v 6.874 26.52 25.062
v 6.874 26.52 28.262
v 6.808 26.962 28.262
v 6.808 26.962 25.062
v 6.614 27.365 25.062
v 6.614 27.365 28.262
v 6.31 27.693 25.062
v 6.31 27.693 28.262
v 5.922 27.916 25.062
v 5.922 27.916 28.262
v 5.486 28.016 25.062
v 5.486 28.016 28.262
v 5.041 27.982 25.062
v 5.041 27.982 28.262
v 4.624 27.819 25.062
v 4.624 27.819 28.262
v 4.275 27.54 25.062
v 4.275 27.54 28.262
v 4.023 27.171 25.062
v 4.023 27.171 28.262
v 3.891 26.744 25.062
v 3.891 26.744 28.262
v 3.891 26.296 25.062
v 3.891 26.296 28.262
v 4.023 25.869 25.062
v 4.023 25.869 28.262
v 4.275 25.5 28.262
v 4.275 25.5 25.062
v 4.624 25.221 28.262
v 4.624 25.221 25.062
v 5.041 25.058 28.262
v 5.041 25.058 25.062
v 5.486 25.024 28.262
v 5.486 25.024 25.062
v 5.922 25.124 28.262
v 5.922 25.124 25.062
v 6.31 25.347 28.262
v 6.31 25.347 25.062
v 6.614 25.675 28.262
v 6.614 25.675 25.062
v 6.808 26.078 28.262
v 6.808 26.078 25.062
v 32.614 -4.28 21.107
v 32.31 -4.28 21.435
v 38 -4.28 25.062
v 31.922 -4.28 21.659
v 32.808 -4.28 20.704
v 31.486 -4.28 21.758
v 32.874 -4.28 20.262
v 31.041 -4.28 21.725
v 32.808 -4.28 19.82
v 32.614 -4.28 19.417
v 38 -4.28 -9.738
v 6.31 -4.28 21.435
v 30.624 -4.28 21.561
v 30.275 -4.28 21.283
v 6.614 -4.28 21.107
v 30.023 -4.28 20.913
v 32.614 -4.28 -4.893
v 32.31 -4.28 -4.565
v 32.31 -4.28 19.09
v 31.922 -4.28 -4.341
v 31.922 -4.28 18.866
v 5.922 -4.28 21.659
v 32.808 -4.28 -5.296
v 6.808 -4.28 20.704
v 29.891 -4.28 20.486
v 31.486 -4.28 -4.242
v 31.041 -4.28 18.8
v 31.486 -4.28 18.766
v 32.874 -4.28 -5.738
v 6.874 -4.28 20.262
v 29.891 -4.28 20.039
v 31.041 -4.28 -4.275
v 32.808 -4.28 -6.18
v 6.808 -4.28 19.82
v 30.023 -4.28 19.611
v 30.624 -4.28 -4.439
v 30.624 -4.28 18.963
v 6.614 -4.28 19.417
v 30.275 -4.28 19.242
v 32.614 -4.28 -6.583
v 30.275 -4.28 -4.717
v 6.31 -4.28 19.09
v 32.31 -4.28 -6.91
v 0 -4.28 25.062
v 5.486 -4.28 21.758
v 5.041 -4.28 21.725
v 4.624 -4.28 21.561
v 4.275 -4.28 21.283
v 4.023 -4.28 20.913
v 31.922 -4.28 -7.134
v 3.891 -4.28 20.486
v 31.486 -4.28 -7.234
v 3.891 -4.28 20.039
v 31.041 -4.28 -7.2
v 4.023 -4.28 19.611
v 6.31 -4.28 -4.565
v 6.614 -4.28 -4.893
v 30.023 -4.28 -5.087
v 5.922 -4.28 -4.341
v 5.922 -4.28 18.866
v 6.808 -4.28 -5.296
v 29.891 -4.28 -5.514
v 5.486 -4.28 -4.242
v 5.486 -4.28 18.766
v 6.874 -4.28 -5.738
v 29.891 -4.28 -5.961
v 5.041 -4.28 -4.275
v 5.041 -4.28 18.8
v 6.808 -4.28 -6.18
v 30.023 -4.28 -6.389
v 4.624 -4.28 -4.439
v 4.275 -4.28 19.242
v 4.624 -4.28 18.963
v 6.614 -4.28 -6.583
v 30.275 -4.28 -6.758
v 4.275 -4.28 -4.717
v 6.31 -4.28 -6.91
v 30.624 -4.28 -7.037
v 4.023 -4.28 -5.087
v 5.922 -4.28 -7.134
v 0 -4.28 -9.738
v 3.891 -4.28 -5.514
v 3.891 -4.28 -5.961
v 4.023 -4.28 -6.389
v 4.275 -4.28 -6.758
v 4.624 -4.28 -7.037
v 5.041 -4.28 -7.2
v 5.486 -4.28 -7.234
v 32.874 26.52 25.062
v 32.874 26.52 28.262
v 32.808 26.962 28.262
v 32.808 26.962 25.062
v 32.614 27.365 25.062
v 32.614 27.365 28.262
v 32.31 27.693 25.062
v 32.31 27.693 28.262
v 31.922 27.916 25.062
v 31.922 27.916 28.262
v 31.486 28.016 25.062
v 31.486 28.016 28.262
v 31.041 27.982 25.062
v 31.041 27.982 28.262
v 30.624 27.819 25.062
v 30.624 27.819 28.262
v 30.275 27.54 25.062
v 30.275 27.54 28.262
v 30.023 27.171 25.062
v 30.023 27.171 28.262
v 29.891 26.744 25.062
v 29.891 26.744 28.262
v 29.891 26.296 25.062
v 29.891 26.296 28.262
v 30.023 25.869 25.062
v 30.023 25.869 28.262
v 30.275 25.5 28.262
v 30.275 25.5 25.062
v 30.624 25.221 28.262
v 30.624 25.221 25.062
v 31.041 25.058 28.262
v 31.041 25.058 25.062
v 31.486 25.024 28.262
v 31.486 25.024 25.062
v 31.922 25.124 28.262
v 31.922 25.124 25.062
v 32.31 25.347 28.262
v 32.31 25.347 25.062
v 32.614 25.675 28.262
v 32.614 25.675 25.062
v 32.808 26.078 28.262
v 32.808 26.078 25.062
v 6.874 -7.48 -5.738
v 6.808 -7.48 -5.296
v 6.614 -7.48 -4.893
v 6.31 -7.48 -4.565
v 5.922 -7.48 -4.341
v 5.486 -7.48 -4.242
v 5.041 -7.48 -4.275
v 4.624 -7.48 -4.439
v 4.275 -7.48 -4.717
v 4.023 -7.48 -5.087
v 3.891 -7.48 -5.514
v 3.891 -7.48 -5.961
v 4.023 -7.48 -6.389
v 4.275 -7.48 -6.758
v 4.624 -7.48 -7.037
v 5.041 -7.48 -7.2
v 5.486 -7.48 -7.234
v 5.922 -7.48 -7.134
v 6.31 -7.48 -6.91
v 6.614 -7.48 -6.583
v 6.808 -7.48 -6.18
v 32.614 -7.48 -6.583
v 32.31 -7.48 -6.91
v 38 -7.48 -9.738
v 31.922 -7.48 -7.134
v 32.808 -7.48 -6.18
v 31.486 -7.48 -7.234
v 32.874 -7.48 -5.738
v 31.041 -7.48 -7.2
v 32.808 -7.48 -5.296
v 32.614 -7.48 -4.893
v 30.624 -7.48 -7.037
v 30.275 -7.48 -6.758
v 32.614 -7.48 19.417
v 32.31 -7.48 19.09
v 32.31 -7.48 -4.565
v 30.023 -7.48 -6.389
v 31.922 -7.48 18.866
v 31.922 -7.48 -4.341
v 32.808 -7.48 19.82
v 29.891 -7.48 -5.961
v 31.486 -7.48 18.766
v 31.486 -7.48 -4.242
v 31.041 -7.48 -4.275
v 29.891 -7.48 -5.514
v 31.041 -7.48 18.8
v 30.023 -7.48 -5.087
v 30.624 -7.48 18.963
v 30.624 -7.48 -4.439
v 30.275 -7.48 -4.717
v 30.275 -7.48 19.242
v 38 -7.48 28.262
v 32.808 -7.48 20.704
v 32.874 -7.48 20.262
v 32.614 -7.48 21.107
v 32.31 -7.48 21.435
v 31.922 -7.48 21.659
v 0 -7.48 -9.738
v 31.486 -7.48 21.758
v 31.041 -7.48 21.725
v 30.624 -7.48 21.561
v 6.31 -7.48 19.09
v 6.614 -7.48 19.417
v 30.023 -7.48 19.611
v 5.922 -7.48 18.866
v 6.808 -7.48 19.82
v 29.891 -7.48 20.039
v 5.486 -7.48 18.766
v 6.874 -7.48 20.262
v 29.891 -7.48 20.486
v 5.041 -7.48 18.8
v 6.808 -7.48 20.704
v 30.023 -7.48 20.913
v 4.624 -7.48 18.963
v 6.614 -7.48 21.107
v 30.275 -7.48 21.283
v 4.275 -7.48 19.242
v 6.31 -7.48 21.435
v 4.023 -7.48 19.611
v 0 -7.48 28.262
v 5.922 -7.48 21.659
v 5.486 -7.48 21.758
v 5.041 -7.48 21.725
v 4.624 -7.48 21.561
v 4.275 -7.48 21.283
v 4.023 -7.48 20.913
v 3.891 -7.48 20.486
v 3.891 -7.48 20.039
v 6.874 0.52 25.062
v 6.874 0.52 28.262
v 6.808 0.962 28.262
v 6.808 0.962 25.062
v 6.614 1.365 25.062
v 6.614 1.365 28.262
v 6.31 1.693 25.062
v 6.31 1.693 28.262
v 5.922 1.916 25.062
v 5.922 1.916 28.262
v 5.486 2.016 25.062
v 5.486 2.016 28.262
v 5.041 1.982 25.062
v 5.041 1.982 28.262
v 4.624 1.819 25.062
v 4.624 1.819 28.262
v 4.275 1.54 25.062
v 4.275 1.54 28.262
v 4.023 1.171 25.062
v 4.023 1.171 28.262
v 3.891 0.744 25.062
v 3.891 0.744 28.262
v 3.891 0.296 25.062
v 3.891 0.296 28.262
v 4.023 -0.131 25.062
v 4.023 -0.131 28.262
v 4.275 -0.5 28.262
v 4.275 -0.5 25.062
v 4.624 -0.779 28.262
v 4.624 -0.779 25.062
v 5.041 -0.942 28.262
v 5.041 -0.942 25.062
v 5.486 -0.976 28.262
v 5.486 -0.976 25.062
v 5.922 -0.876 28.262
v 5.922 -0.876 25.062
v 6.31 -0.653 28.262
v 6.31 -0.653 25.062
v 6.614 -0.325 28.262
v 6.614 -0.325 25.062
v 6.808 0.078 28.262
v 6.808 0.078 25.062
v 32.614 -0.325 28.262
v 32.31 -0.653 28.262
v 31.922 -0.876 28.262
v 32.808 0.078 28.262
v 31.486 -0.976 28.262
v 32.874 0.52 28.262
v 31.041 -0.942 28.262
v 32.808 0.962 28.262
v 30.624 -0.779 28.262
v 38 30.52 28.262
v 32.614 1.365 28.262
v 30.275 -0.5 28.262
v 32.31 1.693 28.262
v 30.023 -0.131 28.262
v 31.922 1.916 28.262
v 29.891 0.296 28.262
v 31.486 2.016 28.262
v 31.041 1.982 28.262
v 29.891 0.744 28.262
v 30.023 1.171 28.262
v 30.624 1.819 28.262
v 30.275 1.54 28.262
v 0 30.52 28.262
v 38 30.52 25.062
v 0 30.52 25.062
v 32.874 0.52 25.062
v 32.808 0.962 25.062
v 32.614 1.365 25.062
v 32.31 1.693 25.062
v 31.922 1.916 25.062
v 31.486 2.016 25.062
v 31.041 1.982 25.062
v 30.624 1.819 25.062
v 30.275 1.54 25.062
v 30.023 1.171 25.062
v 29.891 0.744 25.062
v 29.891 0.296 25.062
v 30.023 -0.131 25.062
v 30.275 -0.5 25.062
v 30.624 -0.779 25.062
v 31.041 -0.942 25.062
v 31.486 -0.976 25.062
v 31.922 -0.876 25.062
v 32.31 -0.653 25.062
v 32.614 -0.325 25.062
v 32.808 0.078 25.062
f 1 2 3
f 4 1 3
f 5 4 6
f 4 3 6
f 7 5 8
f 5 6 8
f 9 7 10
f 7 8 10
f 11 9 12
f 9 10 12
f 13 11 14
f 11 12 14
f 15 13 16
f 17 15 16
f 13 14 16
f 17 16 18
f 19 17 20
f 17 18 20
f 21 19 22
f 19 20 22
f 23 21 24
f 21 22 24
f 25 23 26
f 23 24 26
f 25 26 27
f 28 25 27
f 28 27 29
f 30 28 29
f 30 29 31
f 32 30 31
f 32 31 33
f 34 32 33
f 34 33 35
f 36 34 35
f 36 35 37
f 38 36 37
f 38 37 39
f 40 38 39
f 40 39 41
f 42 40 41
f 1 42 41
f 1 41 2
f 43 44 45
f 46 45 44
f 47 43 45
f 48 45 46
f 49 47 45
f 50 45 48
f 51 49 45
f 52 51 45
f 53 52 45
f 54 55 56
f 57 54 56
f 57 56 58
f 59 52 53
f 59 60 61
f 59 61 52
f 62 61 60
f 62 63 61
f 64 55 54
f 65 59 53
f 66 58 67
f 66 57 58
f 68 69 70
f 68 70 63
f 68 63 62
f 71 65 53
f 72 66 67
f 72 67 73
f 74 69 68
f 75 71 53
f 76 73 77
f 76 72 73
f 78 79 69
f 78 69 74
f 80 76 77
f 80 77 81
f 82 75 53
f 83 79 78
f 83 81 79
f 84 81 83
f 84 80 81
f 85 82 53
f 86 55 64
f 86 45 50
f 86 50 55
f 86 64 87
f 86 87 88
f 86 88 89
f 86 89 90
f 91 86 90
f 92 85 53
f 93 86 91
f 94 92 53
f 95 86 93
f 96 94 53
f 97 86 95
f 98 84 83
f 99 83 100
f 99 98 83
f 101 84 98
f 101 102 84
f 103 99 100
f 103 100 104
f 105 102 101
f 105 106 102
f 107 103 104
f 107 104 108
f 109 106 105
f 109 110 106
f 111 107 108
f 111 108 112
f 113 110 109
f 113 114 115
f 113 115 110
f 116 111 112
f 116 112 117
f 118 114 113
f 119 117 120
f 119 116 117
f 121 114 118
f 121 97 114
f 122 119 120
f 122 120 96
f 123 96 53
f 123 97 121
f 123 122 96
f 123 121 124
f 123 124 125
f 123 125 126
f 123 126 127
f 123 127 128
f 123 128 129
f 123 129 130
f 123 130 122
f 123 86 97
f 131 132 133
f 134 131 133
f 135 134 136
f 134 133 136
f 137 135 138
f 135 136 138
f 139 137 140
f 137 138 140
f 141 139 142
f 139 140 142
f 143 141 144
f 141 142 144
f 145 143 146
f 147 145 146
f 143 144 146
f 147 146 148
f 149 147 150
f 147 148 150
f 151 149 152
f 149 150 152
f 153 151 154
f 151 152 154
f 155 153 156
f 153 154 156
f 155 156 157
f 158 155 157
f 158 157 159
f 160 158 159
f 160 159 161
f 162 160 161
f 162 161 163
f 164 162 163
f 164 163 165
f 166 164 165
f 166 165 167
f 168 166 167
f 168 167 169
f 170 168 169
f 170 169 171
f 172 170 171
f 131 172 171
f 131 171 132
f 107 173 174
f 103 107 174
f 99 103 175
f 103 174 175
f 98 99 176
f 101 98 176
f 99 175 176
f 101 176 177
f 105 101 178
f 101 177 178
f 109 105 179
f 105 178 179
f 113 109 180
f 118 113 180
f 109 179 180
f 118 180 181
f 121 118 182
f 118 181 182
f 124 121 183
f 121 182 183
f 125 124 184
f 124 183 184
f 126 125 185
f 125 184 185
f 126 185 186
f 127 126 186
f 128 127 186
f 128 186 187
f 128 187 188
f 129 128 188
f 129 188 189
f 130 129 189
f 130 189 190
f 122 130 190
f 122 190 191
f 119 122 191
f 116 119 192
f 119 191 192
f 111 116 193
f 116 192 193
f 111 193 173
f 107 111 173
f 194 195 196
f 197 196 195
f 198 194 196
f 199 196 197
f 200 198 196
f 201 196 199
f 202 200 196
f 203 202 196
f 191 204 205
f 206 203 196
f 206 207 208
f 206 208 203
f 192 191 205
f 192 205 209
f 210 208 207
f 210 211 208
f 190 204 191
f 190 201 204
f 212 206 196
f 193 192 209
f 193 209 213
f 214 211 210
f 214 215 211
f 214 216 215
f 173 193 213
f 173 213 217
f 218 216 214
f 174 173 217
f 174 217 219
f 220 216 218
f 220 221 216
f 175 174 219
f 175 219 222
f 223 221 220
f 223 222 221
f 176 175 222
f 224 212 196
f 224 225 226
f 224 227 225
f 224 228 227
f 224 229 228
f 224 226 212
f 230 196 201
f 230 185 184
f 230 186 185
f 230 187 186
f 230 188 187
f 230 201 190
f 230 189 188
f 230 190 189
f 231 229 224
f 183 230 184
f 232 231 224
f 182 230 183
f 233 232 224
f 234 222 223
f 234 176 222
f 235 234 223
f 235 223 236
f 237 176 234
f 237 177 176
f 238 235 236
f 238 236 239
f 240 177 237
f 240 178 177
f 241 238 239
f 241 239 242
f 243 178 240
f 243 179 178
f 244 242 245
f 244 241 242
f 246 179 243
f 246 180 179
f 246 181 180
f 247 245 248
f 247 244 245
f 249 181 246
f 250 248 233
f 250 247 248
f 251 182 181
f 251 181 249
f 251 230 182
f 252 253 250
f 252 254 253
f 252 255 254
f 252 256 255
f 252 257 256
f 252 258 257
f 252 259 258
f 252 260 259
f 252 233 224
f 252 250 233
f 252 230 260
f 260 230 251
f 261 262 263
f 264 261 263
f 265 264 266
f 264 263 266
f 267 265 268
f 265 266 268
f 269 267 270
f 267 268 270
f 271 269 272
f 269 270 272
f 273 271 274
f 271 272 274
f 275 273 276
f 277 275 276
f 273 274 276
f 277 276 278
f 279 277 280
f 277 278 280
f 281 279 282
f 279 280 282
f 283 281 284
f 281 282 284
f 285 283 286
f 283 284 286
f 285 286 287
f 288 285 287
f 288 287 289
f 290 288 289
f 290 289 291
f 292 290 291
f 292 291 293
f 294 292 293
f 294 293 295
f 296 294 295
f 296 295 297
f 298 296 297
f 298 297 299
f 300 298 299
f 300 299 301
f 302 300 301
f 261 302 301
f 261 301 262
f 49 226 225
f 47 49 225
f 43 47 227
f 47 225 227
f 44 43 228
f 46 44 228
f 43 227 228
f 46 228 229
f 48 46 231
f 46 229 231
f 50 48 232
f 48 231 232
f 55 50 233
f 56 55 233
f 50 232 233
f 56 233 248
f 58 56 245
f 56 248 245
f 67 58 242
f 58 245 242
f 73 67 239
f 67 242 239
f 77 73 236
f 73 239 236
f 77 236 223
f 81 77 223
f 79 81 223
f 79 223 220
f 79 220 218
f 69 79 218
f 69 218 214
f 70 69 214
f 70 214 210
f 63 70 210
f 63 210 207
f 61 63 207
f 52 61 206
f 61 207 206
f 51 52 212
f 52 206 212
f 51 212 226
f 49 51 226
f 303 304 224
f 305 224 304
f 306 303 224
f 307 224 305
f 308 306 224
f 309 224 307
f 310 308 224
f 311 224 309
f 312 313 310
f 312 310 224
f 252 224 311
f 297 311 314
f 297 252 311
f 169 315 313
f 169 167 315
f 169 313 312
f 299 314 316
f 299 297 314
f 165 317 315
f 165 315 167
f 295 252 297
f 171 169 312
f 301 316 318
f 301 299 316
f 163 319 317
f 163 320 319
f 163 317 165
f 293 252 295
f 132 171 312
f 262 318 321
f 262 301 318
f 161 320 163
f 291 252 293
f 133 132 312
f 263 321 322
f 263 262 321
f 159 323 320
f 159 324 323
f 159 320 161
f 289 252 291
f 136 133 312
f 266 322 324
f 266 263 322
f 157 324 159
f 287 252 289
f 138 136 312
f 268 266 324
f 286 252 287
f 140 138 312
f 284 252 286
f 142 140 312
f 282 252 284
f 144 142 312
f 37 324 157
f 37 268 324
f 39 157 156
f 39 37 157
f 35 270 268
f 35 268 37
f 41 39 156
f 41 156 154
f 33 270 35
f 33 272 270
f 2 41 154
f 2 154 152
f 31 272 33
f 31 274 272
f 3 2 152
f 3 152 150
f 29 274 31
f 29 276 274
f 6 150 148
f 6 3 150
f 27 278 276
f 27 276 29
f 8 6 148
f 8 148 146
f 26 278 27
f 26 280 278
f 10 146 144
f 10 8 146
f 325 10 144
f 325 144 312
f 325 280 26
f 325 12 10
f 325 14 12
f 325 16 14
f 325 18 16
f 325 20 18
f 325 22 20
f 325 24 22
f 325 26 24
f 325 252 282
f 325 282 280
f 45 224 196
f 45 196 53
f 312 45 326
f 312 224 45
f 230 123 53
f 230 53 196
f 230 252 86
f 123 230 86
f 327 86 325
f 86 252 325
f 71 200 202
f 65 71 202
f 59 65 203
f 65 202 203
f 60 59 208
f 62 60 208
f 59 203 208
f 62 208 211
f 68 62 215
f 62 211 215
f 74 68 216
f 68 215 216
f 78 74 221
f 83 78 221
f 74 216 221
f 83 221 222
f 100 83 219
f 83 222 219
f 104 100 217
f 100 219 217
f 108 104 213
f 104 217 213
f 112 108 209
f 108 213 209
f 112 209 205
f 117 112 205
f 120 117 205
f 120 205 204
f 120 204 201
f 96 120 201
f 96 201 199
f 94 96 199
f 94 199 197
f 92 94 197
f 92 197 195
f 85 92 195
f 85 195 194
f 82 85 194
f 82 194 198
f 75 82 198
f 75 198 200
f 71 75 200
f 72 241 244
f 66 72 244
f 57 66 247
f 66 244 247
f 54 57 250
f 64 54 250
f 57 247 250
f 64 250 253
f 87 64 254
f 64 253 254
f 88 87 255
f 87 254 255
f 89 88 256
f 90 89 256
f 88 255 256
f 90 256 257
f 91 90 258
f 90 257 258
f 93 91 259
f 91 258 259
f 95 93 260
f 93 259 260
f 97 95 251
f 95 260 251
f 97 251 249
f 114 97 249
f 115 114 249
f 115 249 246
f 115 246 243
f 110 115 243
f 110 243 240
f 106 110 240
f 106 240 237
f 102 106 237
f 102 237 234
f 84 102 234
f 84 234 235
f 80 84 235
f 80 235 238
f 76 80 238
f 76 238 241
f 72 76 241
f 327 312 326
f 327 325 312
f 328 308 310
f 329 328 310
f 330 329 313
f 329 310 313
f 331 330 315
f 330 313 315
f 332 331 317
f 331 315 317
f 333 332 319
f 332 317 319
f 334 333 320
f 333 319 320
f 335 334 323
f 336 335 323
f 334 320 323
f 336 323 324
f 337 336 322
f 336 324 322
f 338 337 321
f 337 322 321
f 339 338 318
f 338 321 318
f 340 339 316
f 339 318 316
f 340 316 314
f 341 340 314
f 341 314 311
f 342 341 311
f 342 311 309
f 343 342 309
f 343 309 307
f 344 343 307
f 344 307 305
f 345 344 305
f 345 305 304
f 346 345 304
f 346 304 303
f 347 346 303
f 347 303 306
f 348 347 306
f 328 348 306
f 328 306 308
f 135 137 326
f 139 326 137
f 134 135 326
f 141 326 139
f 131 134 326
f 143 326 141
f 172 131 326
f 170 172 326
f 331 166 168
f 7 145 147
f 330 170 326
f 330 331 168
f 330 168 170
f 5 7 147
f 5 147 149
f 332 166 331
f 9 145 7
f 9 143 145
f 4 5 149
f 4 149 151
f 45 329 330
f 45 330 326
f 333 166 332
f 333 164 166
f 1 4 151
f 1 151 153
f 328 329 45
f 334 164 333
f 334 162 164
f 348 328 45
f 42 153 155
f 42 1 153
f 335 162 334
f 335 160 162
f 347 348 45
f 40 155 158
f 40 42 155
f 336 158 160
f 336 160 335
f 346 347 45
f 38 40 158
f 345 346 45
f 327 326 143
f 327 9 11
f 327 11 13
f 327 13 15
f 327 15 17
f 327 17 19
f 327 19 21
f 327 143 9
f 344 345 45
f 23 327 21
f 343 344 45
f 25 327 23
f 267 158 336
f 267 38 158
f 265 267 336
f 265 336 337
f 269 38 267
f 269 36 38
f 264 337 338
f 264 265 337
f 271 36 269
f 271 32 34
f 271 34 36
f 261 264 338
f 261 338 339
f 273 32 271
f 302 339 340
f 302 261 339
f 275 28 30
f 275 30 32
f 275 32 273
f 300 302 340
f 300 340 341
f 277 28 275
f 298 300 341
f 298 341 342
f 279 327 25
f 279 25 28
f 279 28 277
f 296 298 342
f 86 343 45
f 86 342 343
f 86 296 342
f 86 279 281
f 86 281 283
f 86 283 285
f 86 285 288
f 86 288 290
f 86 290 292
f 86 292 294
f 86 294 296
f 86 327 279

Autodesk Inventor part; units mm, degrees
ref_plane "YZ Plane" through (0, 0, 0) normal (1, 0, 0) x (0, 1, 0)
ref_plane "XZ Plane" through (0, 0, 0) normal (0, 1, 0) x (-1, 0, 0)
ref_plane "XY Plane" through (0, 0, 0) normal (0, 0, 1) x (1, 0, 0)
sketch "Sketch1" plane through (0, 0, 0) normal (1, 0, 0) x (0, 1, 0)
  line L0 (-7.48, 28.2623) -> (30.52, 28.2623)
  line L1 (30.52, 28.2623) -> (30.52, 25.0623)
  line L2 (30.52, 25.0623) -> (-4.28, 25.0623)
  line L3 (-4.28, 25.0623) -> (-4.28, -9.7377)
  line L4 (-4.28, -9.7377) -> (-7.48, -9.7377)
  line L5 (-7.48, -9.7377) -> (-7.48, 28.2623)
  dimension "d0" = 3.2
  dimension "d1" = 38
  dimension "d2" = 3.2
  dimension "d3" = 38
extrude "Extrusion1" add sketch "Sketch1" along normal blind 38
sketch "Sketch2" plane through (0, -7.48, -9.7377) normal (0, -1, 0) x (1, 0, 0)
  circle A0 centre (5.3744, 30) radius 1.5
  line L0 (0, 0) -> (0, 38) projected
  line L1 (0, 0) -> (38, 0) projected
  line L2 (38, 38) -> (38, 0) projected
  line L3 (0, 38) -> (38, 38) projected
  circle A1 centre (5.3744, 4) radius 1.5
  circle A2 centre (31.3744, 30) radius 1.5
  circle A3 centre (31.3744, 4) radius 1.5
  dimension "d13" = 26
  dimension "d16" = 26
  dimension "d19" = 8
  dimension "d20" = 3
extrude "Extrusion2" cut sketch "Sketch2" against normal up to next contours A0 | A1 | A2 | A3
sketch "Sketch3" plane through (0, -7.48, 28.2623) normal (0, 0, 1) x (1, 0, 0)
  circle A0 centre (5.3744, 34) radius 1.5
  line L0 (0, 0) -> (0, 38)
  line L1 (0, 0) -> (38, 0)
  line L2 (38, 38) -> (38, 0)
  line L3 (0, 38) -> (38, 38)
  circle A1 centre (5.3744, 8) radius 1.5
  circle A2 centre (31.3744, 34) radius 1.5
  circle A3 centre (31.3744, 8) radius 1.5
  point P0 (0, 7.48)
  dimension "d27" = 26
  dimension "d28" = 26
  dimension "d30" = 3
  dimension "d31" = 8
extrude "Extrusion3" cut sketch "Sketch3" against normal up to next contours A0 | A1 | A2 | A3
properties part number "Y_carriage_90_bearing_mount"
